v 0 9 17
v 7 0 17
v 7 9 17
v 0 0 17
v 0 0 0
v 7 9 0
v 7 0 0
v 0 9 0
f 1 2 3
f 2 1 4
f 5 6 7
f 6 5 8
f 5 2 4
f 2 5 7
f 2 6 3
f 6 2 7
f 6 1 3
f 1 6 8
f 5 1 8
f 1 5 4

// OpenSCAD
// Generated by SolidPython 1.0.1 on 2020-07-29 00:46:55


cube(size = [7, 9, 17]);
/***********************************************
*********      SolidPython code:      **********
************************************************
 
# import packages: SolidPython
from solid import *
from solid.utils import *
from itertools import chain, combinations, permutations


class Resize:

    def __init__(self, scad_file):
        self.scad_file = scad_file
        #self.scad_file = import_scad(scad_file)
        # cone/cylinder param:
        self.r1 = 0
        self.r2 = 0
        self.h = 0
        # rectangular prism param:
        self.w = 0
        self.l = 0
        # ellipse param:
        self.r = 0

    # import OpenScad code (file name corresponds to shape)


    # classify shape + parameters
    def assign(self, param1, param2, param3):
        if self.scad_file == 'cone.scad':
            self.r1 = param1
            self.r2 = param2
            self.h = param3
        elif self.scad_file == 'cylinder.scad':
            self.r1 = param1
            self.r2 = param2
            self.h = param3
        elif self.scad_file == 'rectangularPrism.scad':
            self.h = param1
            self.l = param2
            self.w = param3
        else:
            self.r = param1
            self.h = param2

    # resize parameters
    def iterate(self):
        x = range(3, 20, 2)
        i = 1
        if self.scad_file == 'cone.scad':
            tempList = list(permutations(x, 2))
            for temp in tempList:
                param1 = temp[0]
                param2 = temp[1]
                filepath = 'produced_scad_files/' + 'cone' + str(param1) + '_' + str(param2) + '_' + '.scad'
                scad_render_to_file(cylinder(h=param1, r1=param2, r2=0), filepath)

        elif self.scad_file == 'cylinder.scad':
            tempList = list(permutations(x, 3))
            for temp in tempList:
                param1 = temp[0]
                param2 = temp[1]
                filepath = 'produced_scad_files/' + 'cylinder' + str(param1) + '_' + str(param2) + '_' + '.scad'
                scad_render_to_file(cylinder(h=param1, r1=param2, r2=param2), filepath)

        elif self.scad_file == 'rectangularPrism.scad':
            tempList = list(permutations(x, 3))
            for temp in tempList:
                param1 = temp[0]
                param2 = temp[1]
                param3 = temp[2]
                filepath = 'produced_scad_files/' + 'rectangularPrism' + str(param1) + '_' + str(param2) + '_' + str(
                    param3) + '.scad'
                scad_render_to_file(cube(size=(param1, param2, param3)), filepath)

        elif self.scad_file == 'ellipse.scad':
            tempList = list(permutations(x, 4))
            for temp in tempList:
                param1 = temp[0]
                param2 = temp[1]
                param3 = temp[2]
                param4 = temp[3]
                filepath = 'produced_scad_files/' + 'ellipse' + str(param1) + '_' + str(param2) + '_' + str(param3) + '_' + str(param4) + '.scad'
                scad_render_to_file(scale([param1, param2, param3])(sphere(r=param4)), filepath)

    def render_to_scadfile(self):
        scad_render_to_file(scad, 'example.scad') 
 
************************************************/
